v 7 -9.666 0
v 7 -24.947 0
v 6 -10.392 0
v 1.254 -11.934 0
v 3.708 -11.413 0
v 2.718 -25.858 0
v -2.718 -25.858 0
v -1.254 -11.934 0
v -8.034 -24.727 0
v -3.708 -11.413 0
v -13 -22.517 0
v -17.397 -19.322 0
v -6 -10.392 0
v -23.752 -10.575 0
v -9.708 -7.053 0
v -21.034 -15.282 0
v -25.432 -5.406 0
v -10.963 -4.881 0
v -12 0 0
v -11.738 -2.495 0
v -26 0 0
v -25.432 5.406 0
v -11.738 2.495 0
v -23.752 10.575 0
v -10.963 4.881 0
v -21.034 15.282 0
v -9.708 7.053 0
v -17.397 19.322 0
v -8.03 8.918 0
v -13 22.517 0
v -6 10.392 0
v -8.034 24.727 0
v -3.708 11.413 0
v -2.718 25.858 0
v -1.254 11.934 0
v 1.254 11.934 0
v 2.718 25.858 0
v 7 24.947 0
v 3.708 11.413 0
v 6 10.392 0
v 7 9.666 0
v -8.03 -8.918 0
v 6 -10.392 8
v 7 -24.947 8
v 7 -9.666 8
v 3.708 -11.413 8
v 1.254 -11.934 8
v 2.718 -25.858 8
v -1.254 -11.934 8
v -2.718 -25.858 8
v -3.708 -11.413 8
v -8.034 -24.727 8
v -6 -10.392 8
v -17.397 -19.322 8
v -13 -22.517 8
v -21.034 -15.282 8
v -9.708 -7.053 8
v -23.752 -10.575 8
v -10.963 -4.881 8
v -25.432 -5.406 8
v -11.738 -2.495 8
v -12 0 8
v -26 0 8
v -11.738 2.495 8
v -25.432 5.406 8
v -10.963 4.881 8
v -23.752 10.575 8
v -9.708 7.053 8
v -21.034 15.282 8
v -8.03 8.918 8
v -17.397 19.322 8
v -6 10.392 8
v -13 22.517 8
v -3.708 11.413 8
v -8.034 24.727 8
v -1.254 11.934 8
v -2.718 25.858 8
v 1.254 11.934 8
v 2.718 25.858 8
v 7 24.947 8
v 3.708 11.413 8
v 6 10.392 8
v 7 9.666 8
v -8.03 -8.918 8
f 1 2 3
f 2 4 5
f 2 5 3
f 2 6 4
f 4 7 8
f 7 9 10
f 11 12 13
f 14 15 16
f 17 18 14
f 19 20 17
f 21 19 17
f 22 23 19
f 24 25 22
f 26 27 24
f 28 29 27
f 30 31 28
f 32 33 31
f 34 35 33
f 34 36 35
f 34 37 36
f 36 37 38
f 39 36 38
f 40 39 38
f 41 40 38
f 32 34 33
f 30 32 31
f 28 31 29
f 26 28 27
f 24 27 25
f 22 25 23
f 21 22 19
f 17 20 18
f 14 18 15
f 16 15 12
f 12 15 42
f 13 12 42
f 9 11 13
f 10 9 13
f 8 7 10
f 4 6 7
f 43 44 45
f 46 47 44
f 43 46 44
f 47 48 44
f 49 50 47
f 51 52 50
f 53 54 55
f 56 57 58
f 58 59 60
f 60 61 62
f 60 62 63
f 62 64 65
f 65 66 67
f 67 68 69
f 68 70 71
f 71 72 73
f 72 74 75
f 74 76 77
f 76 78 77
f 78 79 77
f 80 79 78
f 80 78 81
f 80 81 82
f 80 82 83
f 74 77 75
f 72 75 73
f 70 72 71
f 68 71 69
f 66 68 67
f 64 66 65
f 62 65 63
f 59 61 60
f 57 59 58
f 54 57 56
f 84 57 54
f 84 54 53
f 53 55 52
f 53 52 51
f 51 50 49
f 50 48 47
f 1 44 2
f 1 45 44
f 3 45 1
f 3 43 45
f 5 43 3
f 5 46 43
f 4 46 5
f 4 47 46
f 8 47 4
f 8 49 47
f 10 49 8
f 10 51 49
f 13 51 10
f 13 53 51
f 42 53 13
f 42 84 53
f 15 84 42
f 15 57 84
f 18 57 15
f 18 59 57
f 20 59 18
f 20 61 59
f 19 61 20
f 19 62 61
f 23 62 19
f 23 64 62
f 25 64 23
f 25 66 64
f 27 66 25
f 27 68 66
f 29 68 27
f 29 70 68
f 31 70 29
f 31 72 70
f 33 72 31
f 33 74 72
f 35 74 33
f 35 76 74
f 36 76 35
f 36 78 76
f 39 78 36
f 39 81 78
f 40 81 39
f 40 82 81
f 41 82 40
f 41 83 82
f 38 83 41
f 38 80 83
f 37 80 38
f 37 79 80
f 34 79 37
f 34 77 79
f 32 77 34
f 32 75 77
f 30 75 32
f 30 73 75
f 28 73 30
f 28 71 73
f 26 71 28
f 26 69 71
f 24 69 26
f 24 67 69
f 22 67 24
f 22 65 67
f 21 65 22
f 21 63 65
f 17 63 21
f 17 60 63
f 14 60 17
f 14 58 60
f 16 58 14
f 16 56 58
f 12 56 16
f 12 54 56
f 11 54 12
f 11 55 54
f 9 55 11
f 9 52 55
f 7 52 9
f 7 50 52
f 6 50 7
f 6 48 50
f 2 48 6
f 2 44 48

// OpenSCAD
height = 8;

out_d = 52;
internal_d = 24;

cut_length = 50;
cut_distance = cut_length/2 + 7;


linear_extrude(height=height)
difference() {
    circle(out_d/2, center=true);
    circle(internal_d/2, center=true);
    translate([cut_distance, 0])
    square(cut_length, center=true);
};
